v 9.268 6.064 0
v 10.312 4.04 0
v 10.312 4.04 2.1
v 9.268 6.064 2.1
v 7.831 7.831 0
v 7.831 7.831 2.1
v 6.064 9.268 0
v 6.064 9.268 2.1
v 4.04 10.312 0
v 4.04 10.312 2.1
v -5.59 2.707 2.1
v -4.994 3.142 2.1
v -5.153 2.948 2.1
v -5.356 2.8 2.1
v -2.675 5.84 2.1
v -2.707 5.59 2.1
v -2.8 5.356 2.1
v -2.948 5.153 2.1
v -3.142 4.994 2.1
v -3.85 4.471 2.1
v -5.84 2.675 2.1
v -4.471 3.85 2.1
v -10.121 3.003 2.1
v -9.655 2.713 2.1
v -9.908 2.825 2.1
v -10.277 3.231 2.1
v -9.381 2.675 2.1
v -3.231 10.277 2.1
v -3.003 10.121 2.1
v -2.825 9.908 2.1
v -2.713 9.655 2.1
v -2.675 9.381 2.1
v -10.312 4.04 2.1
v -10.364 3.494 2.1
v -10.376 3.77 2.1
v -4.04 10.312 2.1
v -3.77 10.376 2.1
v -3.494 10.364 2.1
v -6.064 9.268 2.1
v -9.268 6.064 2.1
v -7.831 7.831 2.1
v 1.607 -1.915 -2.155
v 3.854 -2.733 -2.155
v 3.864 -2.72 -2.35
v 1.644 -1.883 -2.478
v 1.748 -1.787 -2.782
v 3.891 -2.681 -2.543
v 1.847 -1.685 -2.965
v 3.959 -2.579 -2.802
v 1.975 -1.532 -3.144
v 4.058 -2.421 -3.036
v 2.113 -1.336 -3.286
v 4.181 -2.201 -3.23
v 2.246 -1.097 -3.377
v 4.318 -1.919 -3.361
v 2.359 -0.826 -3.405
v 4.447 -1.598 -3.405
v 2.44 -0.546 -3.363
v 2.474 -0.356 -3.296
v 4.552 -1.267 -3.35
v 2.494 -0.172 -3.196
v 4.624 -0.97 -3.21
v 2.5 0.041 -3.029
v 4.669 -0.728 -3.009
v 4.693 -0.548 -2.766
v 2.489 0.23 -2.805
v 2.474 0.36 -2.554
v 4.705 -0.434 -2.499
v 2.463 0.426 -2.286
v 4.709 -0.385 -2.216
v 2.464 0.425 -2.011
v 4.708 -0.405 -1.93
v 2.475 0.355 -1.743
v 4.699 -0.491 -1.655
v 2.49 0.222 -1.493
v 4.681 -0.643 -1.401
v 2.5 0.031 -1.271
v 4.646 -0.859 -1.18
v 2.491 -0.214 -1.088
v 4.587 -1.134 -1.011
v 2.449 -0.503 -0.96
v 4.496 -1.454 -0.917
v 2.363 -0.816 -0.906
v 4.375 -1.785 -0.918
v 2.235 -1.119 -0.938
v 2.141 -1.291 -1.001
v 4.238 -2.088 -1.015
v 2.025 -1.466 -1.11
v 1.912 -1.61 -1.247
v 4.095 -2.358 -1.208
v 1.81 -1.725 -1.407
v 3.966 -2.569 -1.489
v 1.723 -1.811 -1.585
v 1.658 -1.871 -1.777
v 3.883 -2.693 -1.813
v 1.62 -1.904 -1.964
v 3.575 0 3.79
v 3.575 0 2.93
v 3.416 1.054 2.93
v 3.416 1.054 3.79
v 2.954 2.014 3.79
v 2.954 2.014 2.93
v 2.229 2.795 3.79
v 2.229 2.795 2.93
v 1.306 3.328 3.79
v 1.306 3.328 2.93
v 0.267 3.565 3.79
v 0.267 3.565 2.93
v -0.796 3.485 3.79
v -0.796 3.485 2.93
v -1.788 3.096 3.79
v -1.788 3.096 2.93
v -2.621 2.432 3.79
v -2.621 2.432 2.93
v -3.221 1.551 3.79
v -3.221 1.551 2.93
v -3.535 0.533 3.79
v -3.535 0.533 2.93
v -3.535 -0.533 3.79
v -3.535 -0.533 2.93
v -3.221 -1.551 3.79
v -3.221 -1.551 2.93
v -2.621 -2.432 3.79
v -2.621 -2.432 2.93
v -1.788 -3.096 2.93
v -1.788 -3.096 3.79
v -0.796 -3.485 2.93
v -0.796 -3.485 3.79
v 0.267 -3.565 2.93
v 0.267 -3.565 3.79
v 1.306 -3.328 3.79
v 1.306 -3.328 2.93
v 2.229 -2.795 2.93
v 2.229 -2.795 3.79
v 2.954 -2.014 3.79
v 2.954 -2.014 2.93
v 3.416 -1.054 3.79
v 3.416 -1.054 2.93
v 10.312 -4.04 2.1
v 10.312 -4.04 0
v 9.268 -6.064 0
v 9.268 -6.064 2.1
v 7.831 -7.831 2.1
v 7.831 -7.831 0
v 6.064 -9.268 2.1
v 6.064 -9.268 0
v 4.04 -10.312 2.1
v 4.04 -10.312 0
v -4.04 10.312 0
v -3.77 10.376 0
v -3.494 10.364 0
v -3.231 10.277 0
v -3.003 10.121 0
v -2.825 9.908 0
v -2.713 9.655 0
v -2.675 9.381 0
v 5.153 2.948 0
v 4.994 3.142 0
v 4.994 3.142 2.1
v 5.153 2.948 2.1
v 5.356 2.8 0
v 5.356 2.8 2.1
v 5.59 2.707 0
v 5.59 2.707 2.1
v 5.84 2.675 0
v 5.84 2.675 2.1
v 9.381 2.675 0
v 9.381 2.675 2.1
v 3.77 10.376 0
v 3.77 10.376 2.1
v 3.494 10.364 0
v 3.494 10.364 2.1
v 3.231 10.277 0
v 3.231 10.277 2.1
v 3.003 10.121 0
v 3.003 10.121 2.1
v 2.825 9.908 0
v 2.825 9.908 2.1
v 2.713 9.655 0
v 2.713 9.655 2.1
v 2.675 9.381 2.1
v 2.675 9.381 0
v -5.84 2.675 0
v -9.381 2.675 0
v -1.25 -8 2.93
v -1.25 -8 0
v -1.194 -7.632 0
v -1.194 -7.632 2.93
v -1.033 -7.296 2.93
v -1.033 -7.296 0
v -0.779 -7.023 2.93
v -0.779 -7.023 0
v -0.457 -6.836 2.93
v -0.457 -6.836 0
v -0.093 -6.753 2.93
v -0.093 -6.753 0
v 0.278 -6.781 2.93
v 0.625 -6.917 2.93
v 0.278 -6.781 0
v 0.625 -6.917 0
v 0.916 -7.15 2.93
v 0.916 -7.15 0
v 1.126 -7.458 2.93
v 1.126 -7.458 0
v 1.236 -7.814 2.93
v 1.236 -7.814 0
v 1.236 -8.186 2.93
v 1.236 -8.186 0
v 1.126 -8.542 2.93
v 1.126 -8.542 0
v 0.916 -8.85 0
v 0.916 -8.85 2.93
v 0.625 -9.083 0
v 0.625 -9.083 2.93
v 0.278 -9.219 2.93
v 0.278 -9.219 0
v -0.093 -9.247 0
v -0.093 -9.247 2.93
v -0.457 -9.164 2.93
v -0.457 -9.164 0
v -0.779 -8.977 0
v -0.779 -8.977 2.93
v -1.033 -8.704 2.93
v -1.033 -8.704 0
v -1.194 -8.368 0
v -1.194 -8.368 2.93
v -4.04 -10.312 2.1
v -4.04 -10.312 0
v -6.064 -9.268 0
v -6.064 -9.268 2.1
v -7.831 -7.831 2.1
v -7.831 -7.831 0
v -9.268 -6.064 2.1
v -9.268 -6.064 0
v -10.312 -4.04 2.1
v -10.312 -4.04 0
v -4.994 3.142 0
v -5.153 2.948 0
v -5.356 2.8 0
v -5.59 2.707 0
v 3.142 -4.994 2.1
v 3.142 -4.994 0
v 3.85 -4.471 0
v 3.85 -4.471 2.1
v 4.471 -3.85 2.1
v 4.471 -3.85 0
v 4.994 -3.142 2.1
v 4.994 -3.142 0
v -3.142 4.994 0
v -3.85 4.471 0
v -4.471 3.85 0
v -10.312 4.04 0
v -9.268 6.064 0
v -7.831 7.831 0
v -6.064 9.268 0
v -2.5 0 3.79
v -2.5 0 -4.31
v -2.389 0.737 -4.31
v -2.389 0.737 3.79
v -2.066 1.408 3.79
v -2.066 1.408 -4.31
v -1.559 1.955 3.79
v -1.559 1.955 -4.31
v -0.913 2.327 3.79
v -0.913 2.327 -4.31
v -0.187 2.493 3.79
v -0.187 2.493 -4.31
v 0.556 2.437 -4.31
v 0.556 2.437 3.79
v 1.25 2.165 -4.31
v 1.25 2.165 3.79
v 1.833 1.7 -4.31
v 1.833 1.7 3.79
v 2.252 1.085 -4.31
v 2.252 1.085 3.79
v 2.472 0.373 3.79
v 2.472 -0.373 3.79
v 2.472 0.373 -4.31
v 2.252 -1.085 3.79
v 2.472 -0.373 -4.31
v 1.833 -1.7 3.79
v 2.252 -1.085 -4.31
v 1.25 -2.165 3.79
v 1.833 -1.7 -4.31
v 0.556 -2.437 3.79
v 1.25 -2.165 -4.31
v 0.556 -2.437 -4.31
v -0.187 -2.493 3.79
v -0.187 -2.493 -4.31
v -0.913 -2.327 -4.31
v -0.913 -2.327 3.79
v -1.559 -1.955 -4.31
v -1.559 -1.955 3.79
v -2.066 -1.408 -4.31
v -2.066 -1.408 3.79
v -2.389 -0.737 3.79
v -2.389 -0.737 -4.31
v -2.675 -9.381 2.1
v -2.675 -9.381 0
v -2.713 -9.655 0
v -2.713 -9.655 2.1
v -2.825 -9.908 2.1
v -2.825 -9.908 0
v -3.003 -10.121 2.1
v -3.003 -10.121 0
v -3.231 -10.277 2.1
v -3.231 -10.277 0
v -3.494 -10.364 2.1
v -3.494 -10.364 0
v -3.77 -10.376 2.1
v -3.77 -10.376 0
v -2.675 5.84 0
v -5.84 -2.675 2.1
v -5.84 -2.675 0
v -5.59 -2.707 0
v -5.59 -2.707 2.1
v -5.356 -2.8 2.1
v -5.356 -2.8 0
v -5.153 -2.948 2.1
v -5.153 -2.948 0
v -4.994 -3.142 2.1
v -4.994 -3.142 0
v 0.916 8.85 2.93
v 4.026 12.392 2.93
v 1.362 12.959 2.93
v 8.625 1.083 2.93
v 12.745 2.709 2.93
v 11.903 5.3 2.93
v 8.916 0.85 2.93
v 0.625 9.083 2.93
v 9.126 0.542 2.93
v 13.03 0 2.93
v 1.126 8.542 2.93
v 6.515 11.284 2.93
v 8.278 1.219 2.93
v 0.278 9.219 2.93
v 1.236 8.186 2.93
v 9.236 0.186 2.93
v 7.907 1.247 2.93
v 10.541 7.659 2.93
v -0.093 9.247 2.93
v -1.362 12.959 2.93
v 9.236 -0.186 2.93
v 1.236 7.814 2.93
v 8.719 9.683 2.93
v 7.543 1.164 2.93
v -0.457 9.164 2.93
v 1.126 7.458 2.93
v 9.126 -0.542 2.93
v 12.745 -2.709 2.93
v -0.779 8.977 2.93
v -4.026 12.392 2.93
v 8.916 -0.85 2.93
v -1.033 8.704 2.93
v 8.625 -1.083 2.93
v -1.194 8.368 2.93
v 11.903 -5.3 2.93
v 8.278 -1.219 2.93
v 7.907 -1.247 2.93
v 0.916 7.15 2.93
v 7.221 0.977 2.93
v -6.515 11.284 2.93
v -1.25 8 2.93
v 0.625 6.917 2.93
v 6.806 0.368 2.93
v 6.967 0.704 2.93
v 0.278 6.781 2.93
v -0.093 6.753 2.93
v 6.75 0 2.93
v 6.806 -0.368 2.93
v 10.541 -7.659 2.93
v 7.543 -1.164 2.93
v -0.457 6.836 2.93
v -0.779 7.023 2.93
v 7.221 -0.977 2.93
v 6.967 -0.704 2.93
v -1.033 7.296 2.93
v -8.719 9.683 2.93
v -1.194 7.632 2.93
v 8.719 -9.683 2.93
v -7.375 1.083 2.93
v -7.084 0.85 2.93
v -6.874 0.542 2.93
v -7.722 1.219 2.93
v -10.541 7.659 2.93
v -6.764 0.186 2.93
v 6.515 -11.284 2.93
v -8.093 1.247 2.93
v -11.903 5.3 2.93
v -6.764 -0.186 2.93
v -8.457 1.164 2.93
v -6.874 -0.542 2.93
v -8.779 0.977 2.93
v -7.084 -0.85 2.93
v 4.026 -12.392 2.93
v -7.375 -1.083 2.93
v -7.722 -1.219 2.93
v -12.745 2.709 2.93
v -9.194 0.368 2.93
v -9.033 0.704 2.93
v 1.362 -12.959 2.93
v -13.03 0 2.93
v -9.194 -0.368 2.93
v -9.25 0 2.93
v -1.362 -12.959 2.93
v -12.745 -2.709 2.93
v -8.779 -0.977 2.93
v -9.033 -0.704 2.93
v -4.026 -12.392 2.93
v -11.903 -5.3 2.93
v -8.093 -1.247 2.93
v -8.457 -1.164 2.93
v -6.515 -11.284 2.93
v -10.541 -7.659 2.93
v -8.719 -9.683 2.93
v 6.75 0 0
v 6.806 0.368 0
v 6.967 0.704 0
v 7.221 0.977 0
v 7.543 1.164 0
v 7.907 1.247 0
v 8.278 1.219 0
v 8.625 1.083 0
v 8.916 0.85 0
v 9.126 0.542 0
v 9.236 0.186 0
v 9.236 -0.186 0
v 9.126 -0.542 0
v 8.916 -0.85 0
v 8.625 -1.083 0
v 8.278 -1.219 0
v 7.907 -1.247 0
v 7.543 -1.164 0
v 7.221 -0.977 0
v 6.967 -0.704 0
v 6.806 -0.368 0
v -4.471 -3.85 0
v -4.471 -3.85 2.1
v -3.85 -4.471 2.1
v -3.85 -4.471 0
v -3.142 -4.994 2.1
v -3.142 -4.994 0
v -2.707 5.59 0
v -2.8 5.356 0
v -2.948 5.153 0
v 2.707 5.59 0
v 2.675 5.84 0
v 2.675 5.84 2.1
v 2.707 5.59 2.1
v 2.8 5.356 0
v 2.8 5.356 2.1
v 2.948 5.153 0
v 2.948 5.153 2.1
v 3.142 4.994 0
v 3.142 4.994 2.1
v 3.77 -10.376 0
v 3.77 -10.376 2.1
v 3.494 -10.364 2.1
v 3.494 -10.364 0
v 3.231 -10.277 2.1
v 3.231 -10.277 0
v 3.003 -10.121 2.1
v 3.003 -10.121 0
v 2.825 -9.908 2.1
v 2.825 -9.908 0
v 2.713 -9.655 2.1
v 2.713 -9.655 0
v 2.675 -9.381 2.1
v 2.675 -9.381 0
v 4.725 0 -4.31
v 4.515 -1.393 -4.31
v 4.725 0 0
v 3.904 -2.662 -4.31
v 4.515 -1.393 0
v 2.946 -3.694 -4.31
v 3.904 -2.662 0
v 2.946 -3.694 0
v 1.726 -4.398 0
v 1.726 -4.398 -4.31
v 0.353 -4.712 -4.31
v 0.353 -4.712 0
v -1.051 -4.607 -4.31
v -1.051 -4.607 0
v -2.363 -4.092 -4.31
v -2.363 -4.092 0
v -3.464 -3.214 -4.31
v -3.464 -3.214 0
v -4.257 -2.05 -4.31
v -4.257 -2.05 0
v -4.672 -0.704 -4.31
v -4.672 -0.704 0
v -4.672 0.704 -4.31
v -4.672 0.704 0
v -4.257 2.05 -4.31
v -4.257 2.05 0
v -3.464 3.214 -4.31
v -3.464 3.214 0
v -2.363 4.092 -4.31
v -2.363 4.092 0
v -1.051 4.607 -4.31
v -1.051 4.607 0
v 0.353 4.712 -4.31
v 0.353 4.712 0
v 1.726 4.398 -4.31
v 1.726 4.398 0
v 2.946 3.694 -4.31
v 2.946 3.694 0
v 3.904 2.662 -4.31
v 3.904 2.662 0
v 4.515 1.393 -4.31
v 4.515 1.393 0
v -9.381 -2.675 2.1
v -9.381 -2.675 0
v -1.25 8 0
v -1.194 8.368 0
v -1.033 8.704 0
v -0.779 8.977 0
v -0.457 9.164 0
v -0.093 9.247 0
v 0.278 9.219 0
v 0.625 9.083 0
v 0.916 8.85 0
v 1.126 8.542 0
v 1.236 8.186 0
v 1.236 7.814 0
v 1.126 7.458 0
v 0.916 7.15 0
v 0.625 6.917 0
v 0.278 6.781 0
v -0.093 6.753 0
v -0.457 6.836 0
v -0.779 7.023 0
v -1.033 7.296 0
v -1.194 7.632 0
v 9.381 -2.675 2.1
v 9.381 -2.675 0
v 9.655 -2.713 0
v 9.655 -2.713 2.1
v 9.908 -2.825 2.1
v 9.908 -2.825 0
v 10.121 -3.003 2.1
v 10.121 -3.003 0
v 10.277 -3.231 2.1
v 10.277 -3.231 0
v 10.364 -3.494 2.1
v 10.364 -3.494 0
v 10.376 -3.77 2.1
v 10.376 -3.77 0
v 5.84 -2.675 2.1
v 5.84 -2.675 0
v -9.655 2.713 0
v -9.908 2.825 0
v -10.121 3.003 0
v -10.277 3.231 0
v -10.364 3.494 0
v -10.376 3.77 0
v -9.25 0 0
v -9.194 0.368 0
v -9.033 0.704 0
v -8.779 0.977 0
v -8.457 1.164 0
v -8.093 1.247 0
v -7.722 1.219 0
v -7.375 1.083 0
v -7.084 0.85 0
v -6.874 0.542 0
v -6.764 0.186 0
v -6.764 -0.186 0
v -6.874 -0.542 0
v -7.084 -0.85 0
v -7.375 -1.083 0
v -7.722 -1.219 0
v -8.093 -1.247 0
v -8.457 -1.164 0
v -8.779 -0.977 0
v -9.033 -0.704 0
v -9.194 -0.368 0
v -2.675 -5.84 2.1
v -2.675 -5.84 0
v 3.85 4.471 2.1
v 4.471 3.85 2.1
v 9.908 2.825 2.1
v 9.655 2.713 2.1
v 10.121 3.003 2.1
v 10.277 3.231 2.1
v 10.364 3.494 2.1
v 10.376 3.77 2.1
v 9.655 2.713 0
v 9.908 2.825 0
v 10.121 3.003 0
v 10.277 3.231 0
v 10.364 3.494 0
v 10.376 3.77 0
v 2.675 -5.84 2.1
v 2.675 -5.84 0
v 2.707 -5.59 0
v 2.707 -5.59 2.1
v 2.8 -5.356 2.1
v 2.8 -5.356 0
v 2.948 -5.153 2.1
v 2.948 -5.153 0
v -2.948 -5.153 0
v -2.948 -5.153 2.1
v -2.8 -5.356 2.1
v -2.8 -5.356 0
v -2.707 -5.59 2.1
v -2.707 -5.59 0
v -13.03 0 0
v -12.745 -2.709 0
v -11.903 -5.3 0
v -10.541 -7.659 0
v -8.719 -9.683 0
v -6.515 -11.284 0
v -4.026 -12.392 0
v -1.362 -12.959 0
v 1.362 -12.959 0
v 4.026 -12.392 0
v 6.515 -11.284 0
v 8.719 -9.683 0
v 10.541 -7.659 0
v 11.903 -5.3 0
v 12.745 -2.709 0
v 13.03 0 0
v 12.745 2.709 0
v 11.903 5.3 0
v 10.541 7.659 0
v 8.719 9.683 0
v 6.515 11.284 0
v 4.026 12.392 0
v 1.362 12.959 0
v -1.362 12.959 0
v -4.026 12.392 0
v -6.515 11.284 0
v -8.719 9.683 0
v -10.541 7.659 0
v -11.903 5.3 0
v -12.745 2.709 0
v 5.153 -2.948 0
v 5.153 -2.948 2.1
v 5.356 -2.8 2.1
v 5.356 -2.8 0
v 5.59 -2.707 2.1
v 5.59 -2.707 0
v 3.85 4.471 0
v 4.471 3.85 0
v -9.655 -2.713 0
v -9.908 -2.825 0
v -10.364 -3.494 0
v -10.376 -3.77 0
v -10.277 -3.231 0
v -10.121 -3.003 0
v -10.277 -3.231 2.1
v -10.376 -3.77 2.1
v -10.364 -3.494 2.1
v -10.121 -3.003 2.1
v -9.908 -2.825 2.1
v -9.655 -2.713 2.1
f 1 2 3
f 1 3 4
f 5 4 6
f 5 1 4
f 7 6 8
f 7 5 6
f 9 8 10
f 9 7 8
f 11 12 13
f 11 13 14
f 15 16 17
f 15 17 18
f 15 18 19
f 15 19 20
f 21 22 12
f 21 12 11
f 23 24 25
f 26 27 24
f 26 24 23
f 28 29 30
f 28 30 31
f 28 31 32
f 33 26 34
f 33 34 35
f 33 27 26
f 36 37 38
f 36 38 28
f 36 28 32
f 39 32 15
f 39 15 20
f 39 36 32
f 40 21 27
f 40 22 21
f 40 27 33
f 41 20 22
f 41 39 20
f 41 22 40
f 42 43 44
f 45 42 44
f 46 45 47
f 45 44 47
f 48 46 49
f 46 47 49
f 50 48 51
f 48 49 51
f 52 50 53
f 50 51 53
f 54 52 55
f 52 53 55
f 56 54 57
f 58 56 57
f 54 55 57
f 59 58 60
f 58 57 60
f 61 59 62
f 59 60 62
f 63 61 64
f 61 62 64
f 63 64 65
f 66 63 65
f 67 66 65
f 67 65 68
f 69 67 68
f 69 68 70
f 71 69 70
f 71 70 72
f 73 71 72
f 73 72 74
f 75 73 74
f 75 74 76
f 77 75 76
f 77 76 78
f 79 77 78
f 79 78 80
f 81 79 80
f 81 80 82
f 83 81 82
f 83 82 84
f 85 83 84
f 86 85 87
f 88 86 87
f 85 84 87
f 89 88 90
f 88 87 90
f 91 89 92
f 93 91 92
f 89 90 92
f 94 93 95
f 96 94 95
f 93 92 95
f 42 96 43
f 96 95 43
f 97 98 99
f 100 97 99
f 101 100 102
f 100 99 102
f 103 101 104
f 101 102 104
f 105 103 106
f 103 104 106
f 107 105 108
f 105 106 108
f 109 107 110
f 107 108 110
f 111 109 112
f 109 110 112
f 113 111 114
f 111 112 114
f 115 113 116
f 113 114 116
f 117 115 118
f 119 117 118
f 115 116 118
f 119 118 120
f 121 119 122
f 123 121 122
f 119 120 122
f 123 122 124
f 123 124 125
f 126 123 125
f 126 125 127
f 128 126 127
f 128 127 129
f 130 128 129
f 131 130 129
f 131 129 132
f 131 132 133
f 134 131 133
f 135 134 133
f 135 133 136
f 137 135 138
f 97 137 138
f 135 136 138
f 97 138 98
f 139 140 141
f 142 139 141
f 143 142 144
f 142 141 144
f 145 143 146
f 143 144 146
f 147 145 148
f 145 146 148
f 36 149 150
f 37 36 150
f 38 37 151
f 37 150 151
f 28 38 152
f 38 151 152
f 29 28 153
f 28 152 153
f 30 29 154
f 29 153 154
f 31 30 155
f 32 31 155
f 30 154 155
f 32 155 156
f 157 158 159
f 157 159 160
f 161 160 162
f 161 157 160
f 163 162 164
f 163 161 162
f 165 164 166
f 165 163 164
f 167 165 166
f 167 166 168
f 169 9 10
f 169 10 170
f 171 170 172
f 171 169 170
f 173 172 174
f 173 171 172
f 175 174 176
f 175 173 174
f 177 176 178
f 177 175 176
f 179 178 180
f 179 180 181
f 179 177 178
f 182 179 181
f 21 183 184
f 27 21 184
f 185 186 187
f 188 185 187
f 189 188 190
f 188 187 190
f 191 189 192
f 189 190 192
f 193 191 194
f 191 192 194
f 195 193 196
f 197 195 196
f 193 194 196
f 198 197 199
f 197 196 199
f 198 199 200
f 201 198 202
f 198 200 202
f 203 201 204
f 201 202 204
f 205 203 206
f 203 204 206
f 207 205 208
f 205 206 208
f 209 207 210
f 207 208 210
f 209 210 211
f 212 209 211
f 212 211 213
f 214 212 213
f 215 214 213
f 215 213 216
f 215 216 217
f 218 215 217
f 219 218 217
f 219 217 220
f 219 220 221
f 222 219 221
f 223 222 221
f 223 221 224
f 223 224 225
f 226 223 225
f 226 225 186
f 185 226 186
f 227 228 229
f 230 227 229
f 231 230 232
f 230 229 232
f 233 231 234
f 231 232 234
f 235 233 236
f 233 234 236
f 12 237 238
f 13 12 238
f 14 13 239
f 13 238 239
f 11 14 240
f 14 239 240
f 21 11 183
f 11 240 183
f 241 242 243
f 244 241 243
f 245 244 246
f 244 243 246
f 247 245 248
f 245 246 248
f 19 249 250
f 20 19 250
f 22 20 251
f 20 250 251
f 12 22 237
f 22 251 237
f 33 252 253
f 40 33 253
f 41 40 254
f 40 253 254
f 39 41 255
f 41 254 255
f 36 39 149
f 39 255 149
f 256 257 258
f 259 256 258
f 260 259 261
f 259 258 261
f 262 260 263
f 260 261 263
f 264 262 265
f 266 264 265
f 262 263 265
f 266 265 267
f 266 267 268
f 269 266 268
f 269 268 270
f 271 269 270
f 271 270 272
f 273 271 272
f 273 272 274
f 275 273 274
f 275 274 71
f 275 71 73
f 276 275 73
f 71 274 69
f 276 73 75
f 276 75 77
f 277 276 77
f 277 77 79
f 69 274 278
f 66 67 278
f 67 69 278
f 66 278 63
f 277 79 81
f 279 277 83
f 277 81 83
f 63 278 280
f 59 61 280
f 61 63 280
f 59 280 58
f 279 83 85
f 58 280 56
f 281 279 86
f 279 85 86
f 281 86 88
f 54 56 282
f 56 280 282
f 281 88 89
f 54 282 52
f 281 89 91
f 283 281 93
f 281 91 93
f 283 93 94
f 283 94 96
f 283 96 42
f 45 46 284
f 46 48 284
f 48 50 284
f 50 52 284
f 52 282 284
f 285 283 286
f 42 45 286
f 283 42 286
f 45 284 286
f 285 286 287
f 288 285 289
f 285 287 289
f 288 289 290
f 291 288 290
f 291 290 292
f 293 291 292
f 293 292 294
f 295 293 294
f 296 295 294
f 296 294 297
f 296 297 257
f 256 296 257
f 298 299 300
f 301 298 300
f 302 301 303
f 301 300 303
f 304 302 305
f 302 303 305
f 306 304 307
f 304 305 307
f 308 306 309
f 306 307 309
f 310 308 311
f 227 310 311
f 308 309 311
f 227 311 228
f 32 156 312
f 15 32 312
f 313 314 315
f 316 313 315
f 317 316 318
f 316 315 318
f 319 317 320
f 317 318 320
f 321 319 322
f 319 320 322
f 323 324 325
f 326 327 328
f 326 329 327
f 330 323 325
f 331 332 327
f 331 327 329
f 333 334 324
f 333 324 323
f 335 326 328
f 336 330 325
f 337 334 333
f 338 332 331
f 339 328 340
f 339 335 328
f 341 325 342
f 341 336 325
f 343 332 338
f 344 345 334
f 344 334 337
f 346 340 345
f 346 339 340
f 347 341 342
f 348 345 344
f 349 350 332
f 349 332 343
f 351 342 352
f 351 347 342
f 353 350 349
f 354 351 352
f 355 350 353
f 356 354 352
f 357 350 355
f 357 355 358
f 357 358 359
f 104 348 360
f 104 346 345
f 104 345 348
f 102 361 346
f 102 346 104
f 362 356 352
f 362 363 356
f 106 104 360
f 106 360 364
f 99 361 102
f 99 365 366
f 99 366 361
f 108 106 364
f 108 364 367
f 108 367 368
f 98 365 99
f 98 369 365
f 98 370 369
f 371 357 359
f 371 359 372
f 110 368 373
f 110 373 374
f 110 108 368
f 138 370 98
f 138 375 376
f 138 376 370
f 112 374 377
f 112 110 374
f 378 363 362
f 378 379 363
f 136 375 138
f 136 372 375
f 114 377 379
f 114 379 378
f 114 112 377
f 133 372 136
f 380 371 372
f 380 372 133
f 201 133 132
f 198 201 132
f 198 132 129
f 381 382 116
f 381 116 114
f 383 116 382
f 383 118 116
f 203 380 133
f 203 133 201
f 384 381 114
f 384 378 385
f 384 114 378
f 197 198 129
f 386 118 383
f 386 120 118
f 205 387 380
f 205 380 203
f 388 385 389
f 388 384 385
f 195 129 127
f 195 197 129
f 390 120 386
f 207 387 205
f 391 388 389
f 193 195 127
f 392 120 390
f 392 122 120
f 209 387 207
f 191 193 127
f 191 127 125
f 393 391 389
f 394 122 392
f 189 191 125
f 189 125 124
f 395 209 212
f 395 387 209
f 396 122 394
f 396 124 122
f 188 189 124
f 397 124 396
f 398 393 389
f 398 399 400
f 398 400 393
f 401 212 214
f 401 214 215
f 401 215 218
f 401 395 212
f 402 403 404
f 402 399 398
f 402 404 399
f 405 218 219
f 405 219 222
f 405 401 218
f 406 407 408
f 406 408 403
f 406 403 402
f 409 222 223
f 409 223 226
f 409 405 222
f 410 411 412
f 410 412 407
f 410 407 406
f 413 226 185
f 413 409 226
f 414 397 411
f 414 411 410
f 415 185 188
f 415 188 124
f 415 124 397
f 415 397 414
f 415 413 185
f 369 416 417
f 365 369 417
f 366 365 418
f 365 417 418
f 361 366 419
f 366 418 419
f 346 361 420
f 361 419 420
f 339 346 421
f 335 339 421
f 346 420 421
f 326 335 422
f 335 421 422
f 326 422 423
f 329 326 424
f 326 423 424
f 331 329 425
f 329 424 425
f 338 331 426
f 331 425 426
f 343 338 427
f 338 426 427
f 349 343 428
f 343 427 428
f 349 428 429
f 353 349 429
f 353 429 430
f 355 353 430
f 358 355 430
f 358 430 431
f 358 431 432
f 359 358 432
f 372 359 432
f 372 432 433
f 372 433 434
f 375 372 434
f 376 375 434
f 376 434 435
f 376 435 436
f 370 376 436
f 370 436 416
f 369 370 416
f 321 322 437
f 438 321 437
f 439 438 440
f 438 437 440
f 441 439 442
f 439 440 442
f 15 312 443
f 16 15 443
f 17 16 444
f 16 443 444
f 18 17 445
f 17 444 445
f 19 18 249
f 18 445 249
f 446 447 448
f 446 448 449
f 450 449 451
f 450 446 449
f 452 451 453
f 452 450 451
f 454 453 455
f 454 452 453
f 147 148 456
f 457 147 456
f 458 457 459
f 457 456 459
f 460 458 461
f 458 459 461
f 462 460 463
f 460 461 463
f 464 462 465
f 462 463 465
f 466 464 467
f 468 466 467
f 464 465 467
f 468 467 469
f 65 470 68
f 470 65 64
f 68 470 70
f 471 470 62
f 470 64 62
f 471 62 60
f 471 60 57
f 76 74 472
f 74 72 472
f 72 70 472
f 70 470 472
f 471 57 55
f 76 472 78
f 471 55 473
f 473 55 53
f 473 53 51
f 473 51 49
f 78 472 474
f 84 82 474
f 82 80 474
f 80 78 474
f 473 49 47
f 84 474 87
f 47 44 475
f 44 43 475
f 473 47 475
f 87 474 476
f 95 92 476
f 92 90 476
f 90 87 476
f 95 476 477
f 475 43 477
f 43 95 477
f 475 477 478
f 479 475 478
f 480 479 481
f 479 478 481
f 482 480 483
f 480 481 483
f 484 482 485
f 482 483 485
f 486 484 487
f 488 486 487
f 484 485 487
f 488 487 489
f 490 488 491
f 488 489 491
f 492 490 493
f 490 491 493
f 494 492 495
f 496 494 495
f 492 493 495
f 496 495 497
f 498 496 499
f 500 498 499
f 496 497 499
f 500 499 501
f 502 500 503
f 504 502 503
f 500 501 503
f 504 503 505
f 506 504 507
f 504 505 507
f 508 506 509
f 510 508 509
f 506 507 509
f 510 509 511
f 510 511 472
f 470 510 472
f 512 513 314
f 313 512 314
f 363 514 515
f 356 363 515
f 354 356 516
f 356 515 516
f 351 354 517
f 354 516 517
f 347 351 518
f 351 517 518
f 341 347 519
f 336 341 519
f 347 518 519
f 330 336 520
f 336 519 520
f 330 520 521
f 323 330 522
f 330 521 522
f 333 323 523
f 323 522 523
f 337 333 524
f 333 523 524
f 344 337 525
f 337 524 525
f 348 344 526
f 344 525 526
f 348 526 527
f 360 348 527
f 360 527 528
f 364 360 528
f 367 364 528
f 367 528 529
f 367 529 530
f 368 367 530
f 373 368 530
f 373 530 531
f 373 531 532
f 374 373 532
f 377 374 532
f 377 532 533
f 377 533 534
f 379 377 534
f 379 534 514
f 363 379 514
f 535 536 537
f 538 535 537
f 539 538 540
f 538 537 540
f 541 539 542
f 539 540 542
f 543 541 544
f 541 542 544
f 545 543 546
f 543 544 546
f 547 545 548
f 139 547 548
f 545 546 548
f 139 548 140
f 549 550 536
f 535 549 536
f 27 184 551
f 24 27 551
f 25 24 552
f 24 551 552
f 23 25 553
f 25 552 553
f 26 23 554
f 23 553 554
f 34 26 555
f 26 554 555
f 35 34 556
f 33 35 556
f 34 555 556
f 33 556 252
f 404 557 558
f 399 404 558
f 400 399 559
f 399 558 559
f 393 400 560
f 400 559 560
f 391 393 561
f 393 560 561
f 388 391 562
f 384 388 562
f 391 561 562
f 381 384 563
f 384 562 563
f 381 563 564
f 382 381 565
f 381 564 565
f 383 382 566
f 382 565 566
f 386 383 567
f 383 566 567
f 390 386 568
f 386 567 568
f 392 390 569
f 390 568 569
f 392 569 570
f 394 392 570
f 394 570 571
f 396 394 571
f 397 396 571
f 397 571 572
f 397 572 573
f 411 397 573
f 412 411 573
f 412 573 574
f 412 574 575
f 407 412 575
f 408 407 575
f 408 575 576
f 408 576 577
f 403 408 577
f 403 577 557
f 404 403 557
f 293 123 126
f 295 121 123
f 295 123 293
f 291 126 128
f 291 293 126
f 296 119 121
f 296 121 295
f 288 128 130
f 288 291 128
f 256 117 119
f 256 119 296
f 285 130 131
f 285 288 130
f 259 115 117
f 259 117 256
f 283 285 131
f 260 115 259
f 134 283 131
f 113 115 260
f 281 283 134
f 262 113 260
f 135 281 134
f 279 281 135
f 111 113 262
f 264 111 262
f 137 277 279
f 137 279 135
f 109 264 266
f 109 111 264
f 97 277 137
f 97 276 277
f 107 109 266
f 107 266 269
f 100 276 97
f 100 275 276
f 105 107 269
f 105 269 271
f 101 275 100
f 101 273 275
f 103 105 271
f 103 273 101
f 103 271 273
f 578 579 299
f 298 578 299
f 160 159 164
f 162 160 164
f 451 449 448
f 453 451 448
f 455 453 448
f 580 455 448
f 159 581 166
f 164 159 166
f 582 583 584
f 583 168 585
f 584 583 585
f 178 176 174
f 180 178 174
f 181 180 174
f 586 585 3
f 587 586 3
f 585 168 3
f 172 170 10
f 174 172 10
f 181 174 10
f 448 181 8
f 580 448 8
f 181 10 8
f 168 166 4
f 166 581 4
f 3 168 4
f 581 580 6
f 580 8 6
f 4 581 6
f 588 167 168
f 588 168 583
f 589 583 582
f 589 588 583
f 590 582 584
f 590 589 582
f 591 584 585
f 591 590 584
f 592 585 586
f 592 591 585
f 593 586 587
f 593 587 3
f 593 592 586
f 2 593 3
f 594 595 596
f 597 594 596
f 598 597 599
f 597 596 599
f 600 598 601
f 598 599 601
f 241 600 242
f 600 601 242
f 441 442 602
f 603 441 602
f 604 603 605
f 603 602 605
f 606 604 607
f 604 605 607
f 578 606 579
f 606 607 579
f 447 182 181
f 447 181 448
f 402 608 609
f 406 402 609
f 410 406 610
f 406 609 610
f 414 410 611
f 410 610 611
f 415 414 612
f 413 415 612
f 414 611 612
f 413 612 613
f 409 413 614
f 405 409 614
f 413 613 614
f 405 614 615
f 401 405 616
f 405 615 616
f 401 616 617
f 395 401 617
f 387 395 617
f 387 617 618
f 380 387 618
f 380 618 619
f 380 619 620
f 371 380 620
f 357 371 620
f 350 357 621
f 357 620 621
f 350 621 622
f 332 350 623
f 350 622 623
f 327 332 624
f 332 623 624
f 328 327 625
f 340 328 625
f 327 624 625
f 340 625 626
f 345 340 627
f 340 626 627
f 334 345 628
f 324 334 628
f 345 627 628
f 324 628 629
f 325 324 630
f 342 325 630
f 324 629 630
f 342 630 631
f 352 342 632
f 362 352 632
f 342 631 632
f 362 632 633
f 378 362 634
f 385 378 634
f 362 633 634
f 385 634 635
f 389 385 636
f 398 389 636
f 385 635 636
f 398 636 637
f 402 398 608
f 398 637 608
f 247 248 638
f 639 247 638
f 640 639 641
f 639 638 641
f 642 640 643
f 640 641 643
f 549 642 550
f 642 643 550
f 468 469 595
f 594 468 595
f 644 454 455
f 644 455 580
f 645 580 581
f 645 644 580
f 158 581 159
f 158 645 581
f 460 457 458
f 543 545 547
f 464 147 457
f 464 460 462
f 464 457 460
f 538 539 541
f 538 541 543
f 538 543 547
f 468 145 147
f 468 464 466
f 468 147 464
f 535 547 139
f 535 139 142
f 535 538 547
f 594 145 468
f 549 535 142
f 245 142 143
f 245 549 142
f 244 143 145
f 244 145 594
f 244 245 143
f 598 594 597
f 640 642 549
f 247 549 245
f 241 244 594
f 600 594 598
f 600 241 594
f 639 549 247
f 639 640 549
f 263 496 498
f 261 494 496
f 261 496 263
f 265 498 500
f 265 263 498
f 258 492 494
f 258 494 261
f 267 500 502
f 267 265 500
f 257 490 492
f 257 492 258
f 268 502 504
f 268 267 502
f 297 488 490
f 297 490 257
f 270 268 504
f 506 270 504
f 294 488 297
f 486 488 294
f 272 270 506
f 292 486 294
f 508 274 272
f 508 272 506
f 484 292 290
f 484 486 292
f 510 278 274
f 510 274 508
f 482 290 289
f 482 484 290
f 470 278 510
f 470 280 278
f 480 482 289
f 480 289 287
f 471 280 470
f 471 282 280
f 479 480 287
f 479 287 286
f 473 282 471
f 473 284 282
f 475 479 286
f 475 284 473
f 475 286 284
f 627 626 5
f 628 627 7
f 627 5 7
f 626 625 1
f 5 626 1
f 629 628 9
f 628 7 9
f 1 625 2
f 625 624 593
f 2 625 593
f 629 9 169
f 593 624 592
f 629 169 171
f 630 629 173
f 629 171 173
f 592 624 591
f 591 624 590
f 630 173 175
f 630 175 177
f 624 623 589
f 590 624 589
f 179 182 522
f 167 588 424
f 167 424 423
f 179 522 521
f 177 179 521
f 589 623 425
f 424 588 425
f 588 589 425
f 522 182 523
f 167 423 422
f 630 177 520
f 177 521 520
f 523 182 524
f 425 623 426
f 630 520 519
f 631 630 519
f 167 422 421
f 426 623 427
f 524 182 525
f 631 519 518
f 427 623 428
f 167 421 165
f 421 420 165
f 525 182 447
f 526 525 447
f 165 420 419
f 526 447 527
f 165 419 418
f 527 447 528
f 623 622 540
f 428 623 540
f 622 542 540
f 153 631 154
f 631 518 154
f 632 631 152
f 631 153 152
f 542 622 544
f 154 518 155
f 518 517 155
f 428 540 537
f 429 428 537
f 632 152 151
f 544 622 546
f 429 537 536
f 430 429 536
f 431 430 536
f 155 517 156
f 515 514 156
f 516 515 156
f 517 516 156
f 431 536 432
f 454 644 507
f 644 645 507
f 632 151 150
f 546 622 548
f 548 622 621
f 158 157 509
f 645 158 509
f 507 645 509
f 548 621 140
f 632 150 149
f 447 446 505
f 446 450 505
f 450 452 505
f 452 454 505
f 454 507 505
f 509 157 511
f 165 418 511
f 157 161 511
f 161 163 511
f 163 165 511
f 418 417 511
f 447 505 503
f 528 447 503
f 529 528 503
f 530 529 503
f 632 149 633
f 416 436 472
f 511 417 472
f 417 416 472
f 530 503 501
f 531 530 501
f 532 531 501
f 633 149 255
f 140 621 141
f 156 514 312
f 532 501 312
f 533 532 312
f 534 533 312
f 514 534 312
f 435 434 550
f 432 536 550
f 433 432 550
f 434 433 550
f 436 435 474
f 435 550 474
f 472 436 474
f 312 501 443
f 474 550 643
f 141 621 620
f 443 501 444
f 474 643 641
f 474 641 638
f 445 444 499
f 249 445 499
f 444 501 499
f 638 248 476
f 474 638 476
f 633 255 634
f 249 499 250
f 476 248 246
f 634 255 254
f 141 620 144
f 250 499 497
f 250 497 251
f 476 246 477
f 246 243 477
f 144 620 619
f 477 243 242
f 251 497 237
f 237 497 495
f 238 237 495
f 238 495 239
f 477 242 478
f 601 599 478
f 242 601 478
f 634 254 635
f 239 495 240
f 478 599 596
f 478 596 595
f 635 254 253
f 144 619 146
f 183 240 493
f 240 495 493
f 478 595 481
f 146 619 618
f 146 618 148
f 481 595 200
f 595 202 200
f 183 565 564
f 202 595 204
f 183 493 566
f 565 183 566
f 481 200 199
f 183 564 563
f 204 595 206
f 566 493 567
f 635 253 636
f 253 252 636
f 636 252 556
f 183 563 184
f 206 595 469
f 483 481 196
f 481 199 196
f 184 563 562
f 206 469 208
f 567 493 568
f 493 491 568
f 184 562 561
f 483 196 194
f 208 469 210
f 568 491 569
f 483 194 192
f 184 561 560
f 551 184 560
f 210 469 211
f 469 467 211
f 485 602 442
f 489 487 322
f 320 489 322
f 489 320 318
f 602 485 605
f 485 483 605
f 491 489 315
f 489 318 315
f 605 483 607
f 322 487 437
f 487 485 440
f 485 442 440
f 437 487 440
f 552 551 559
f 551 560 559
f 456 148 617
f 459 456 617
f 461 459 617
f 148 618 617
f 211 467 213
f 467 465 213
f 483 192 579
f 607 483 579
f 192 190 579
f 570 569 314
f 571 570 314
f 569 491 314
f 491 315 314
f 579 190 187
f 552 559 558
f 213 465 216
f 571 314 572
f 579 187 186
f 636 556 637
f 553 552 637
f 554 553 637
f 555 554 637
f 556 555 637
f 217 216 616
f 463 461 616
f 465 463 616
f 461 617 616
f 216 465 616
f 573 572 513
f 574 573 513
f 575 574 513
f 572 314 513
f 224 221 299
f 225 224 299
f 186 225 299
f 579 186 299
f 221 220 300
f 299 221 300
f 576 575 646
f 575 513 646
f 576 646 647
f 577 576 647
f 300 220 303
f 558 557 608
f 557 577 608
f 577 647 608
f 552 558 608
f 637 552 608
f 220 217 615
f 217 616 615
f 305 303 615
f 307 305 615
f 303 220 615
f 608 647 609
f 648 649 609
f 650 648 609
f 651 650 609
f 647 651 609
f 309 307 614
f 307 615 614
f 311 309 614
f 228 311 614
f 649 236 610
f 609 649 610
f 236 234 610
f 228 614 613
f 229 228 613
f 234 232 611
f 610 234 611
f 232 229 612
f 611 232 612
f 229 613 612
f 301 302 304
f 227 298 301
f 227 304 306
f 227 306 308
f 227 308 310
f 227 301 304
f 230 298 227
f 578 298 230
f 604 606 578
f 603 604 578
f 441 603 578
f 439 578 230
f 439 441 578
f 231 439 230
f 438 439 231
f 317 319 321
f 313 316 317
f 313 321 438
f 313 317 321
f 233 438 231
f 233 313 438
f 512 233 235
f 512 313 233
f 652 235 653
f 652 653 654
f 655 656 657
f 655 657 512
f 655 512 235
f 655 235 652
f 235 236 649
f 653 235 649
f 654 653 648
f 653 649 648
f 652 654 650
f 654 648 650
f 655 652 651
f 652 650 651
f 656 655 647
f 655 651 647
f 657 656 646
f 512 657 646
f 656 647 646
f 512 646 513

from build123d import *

# Parameters (mm, degrees)
SCHIZZO1_R                     = 13.03
ESTRUSIONE_ESTRUSIONE1_DEPTH   = 2.93
SCHIZZO2_R                     = 3.575
ESTRUSIONE_ESTRUSIONE2_DEPTH   = 0.86
SCHIZZO3_R                     = 4.725
ESTRUSIONE_ESTRUSIONE3_DEPTH   = 4.31
SCHIZZO4_R                     = 2.5
TAGLIO_ESTRUSIONE1_DEPTH       = 21.12887975
FORO_FILETTATO_M3X0_5_1_D      = 2.5
TAGLIO_ESTRUSIONE2_DEPTH       = 2.1
FORO_FILETTATO_M3X0_5_2_REACH  = 25.201
FORO_FILETTATO_M3X0_5_2_BORE_R = 1.25


with BuildPart() as part:
    # Schizzo1 → Estrusione-Estrusione1 (new body)
    with BuildSketch(Plane.XY):
        with Locations(Location((0, 0, 0), (0, 0, 180))):
            Circle(SCHIZZO1_R)
    extrude(amount=ESTRUSIONE_ESTRUSIONE1_DEPTH)

    # Schizzo2 → Estrusione-Estrusione2 (add)
    with BuildSketch(Plane.XY.offset(2.93)):
        Circle(SCHIZZO2_R)
    extrude(amount=ESTRUSIONE_ESTRUSIONE2_DEPTH)

    # Schizzo3 → Estrusione-Estrusione3 (add)
    with BuildSketch(Plane(origin=(0, 0, 0), x_dir=(-1, 0, 0), z_dir=(0, 0, -1))):
        with Locations(Location((0, 0, 0), (0, 0, 180))):
            Circle(SCHIZZO3_R)
    extrude(amount=ESTRUSIONE_ESTRUSIONE3_DEPTH)

    # Schizzo4 → Taglio-Estrusione1 (cut, through all)
    with BuildSketch(Plane(origin=(0, 0, -4.31), x_dir=(-1, 0, 0), z_dir=(0, 0, -1))):
        Circle(SCHIZZO4_R)
    extrude(amount=-TAGLIO_ESTRUSIONE1_DEPTH, mode=Mode.SUBTRACT)

    # Foro filettato M3x0.5-1 (through all)
    with Locations(Plane.XY.offset(2.93)):
        with Locations((0, 8), (0, -8), (8, 0), (-8, 0)):
            Hole(FORO_FILETTATO_M3X0_5_1_D / 2)

    # Schizzo7 → Taglio-Estrusione2 (cut)
    with BuildSketch(Plane(origin=(0, 0, 0), x_dir=(-1, 0, 0), z_dir=(0, 0, -1))):
        with BuildLine():
            Line((2.675, 9.38083152), (2.675, 5.839895119))
            ThreePointArc((2.675, 5.839895119), (2.799611887, 5.356474337), (3.142391304, 4.993533507))
            ThreePointArc((3.142391304, 4.993533507), (4.171930009, 4.171930009), (4.993533507, 3.142391304))
            ThreePointArc((4.993533507, 3.142391304), (5.356474337, 2.799611887), (5.839895119, 2.675))
            Line((5.839895119, 2.675), (9.38083152, 2.675))
            ThreePointArc((9.38083152, 2.675), (10.206895763, 3.111424037), (10.311931422, 4.039764268))
            ThreePointArc((10.311931422, 4.039764268), (7.831207602, 7.831207602), (4.039764268, 10.311931422))
            ThreePointArc((4.039764268, 10.311931422), (3.111424037, 10.206895763), (2.675, 9.38083152))
        make_face()
        with BuildLine():
            Line((-2.675, 9.38083152), (-2.675, 5.839895119))
            ThreePointArc((-2.675, 5.839895119), (-2.799611887, 5.356474337), (-3.142391304, 4.993533507))
            ThreePointArc((-3.142391304, 4.993533507), (-4.171930009, 4.171930009), (-4.993533507, 3.142391304))
            ThreePointArc((-4.993533507, 3.142391304), (-5.356474337, 2.799611887), (-5.839895119, 2.675))
            Line((-5.839895119, 2.675), (-9.38083152, 2.675))
            ThreePointArc((-9.38083152, 2.675), (-10.206895763, 3.111424037), (-10.311931422, 4.039764268))
            ThreePointArc((-10.311931422, 4.039764268), (-7.831207602, 7.831207602), (-4.039764268, 10.311931422))
            ThreePointArc((-4.039764268, 10.311931422), (-3.111424037, 10.206895763), (-2.675, 9.38083152))
        make_face()
        with BuildLine():
            Line((9.38083152, -2.675), (5.839895119, -2.675))
            ThreePointArc((5.839895119, -2.675), (5.356474337, -2.799611887), (4.993533507, -3.142391304))
            ThreePointArc((4.993533507, -3.142391304), (4.171930009, -4.171930009), (3.142391304, -4.993533507))
            ThreePointArc((3.142391304, -4.993533507), (2.799611887, -5.356474337), (2.675, -5.839895119))
            Line((2.675, -5.839895119), (2.675, -9.38083152))
            ThreePointArc((2.675, -9.38083152), (3.111424037, -10.206895763), (4.039764268, -10.311931422))
            ThreePointArc((4.039764268, -10.311931422), (7.831207602, -7.831207602), (10.311931422, -4.039764268))
            ThreePointArc((10.311931422, -4.039764268), (10.206895763, -3.111424037), (9.38083152, -2.675))
        make_face()
        with BuildLine():
            Line((-2.675, -9.38083152), (-2.675, -5.839895119))
            ThreePointArc((-2.675, -5.839895119), (-2.799611887, -5.356474337), (-3.142391304, -4.993533507))
            ThreePointArc((-3.142391304, -4.993533507), (-4.171930009, -4.171930009), (-4.993533507, -3.142391304))
            ThreePointArc((-4.993533507, -3.142391304), (-5.356474337, -2.799611887), (-5.839895119, -2.675))
            Line((-5.839895119, -2.675), (-9.38083152, -2.675))
            ThreePointArc((-9.38083152, -2.675), (-10.206895763, -3.111424037), (-10.311931422, -4.039764268))
            ThreePointArc((-10.311931422, -4.039764268), (-7.831207602, -7.831207602), (-4.039764268, -10.311931422))
            ThreePointArc((-4.039764268, -10.311931422), (-3.111424037, -10.206895763), (-2.675, -9.38083152))
        make_face()
    extrude(amount=-TAGLIO_ESTRUSIONE2_DEPTH, mode=Mode.SUBTRACT)

    # Foro filettato M3x0.5-2 bore → Foro filettato M3x0.5-2 (cut, up to next)
    with BuildSketch(Plane(origin=(4.440047633, -1.616045177, 0), x_dir=(-0.3420201433256662, -0.9396926207859093, 0), z_dir=(0.9396926207859093, -0.3420201433256662, 0)), mode=Mode.PRIVATE) as foro_filettato_m3x0_5_2_sk1:
        with Locations((0, 2.155)):
            Circle(FORO_FILETTATO_M3X0_5_2_BORE_R)
    foro_filettato_m3x0_5_2_tool1 = extrude(foro_filettato_m3x0_5_2_sk1.sketch, amount=-FORO_FILETTATO_M3X0_5_2_REACH, mode=Mode.PRIVATE) & part.part
    add(foro_filettato_m3x0_5_2_tool1.solids().sort_by_distance((4.440048, -1.616045, -2.155))[0], mode=Mode.SUBTRACT)


solid = part.part
